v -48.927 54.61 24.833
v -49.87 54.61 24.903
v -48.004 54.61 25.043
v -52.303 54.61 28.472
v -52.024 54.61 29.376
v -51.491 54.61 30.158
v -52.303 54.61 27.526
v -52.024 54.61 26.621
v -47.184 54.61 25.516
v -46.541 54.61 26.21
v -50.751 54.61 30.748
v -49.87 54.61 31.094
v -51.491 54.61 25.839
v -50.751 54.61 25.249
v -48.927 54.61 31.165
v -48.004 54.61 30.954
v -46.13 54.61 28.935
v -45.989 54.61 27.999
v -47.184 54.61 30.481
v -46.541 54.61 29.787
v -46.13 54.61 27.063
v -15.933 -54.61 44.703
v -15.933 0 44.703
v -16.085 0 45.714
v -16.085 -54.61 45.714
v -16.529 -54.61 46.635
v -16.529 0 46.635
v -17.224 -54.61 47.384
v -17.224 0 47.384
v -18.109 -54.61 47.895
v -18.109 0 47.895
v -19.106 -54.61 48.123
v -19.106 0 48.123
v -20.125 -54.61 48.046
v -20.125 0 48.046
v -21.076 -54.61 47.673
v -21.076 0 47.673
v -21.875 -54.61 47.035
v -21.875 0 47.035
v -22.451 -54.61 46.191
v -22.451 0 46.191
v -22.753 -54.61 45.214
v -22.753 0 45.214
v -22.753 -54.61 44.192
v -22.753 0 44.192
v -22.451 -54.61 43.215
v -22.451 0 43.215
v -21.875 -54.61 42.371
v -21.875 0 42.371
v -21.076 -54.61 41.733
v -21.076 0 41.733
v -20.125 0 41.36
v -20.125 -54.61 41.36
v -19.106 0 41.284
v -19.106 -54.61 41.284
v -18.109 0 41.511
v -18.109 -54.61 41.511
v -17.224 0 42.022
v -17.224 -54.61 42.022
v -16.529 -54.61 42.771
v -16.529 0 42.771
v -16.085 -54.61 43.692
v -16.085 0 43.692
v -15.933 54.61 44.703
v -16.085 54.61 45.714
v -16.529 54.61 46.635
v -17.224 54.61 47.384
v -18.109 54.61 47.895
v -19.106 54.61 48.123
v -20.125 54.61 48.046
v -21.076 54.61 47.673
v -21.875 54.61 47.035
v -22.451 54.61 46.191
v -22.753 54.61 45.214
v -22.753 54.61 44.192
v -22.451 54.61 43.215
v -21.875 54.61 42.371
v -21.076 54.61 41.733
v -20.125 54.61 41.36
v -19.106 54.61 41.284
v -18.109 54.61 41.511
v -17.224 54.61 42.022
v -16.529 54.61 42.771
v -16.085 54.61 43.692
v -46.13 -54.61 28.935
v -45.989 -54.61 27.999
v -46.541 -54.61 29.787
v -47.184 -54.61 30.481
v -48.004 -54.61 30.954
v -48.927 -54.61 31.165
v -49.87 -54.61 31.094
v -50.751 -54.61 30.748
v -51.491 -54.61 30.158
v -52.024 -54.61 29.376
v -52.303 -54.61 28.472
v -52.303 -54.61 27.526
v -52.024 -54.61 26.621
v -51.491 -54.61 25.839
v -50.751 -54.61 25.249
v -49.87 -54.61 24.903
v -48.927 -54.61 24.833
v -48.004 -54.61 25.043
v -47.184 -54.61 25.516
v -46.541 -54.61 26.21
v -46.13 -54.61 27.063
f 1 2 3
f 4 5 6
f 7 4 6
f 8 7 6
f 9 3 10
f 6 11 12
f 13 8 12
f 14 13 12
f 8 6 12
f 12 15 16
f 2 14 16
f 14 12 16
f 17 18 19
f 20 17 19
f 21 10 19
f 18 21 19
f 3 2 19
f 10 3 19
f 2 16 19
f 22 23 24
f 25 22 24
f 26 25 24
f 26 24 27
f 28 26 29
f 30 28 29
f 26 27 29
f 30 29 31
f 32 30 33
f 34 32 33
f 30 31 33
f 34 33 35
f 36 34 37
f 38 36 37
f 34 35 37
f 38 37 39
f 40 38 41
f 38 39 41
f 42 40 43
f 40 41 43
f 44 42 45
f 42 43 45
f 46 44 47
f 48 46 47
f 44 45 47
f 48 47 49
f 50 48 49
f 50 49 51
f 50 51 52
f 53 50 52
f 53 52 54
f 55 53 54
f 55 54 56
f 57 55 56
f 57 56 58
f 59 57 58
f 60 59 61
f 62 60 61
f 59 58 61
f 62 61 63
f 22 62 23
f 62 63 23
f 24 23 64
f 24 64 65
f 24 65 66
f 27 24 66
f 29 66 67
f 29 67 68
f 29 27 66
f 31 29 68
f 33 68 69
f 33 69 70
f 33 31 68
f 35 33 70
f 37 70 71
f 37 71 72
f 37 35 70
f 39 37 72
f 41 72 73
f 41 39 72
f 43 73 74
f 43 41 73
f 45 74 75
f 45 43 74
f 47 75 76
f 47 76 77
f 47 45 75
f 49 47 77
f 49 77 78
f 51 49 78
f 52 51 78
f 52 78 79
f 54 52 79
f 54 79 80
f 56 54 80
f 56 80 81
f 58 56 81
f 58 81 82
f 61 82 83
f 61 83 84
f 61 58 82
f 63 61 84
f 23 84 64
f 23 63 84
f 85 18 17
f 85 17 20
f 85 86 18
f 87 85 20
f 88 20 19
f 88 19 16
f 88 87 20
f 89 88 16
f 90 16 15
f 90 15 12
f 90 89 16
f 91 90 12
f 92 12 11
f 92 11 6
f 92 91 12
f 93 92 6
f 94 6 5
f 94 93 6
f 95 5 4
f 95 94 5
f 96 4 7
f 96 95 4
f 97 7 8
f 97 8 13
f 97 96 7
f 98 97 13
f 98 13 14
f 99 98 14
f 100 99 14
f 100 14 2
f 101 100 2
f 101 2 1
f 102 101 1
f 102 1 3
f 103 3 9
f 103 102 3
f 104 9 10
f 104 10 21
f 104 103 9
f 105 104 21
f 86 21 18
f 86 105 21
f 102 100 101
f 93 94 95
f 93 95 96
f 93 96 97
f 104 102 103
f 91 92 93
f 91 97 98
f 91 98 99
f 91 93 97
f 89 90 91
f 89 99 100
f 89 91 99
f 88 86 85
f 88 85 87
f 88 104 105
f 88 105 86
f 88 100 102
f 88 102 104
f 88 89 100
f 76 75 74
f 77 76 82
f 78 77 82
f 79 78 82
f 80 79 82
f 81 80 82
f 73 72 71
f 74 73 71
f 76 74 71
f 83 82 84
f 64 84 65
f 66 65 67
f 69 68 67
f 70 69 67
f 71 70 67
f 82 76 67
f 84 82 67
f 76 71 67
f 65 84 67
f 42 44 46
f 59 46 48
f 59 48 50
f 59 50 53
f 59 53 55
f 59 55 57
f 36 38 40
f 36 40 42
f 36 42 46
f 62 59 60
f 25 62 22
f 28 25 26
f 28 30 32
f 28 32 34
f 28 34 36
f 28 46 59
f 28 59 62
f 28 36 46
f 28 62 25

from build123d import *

# Parameters (mm, degrees)
F0_R     = 3.429
F0_R_2   = 3.175
F1_DEPTH = 54.61


with BuildPart() as f1:
    # F0 (on Front) → F1 (new body, symmetric)
    with BuildSketch(Plane.XZ):
        with Locations((-19.36185, 44.703096)):
            Circle(F0_R)
        with Locations((-49.163915, 27.998755)):
            Circle(F0_R_2)
    extrude(amount=F1_DEPTH, both=True)


solid = f1.part
